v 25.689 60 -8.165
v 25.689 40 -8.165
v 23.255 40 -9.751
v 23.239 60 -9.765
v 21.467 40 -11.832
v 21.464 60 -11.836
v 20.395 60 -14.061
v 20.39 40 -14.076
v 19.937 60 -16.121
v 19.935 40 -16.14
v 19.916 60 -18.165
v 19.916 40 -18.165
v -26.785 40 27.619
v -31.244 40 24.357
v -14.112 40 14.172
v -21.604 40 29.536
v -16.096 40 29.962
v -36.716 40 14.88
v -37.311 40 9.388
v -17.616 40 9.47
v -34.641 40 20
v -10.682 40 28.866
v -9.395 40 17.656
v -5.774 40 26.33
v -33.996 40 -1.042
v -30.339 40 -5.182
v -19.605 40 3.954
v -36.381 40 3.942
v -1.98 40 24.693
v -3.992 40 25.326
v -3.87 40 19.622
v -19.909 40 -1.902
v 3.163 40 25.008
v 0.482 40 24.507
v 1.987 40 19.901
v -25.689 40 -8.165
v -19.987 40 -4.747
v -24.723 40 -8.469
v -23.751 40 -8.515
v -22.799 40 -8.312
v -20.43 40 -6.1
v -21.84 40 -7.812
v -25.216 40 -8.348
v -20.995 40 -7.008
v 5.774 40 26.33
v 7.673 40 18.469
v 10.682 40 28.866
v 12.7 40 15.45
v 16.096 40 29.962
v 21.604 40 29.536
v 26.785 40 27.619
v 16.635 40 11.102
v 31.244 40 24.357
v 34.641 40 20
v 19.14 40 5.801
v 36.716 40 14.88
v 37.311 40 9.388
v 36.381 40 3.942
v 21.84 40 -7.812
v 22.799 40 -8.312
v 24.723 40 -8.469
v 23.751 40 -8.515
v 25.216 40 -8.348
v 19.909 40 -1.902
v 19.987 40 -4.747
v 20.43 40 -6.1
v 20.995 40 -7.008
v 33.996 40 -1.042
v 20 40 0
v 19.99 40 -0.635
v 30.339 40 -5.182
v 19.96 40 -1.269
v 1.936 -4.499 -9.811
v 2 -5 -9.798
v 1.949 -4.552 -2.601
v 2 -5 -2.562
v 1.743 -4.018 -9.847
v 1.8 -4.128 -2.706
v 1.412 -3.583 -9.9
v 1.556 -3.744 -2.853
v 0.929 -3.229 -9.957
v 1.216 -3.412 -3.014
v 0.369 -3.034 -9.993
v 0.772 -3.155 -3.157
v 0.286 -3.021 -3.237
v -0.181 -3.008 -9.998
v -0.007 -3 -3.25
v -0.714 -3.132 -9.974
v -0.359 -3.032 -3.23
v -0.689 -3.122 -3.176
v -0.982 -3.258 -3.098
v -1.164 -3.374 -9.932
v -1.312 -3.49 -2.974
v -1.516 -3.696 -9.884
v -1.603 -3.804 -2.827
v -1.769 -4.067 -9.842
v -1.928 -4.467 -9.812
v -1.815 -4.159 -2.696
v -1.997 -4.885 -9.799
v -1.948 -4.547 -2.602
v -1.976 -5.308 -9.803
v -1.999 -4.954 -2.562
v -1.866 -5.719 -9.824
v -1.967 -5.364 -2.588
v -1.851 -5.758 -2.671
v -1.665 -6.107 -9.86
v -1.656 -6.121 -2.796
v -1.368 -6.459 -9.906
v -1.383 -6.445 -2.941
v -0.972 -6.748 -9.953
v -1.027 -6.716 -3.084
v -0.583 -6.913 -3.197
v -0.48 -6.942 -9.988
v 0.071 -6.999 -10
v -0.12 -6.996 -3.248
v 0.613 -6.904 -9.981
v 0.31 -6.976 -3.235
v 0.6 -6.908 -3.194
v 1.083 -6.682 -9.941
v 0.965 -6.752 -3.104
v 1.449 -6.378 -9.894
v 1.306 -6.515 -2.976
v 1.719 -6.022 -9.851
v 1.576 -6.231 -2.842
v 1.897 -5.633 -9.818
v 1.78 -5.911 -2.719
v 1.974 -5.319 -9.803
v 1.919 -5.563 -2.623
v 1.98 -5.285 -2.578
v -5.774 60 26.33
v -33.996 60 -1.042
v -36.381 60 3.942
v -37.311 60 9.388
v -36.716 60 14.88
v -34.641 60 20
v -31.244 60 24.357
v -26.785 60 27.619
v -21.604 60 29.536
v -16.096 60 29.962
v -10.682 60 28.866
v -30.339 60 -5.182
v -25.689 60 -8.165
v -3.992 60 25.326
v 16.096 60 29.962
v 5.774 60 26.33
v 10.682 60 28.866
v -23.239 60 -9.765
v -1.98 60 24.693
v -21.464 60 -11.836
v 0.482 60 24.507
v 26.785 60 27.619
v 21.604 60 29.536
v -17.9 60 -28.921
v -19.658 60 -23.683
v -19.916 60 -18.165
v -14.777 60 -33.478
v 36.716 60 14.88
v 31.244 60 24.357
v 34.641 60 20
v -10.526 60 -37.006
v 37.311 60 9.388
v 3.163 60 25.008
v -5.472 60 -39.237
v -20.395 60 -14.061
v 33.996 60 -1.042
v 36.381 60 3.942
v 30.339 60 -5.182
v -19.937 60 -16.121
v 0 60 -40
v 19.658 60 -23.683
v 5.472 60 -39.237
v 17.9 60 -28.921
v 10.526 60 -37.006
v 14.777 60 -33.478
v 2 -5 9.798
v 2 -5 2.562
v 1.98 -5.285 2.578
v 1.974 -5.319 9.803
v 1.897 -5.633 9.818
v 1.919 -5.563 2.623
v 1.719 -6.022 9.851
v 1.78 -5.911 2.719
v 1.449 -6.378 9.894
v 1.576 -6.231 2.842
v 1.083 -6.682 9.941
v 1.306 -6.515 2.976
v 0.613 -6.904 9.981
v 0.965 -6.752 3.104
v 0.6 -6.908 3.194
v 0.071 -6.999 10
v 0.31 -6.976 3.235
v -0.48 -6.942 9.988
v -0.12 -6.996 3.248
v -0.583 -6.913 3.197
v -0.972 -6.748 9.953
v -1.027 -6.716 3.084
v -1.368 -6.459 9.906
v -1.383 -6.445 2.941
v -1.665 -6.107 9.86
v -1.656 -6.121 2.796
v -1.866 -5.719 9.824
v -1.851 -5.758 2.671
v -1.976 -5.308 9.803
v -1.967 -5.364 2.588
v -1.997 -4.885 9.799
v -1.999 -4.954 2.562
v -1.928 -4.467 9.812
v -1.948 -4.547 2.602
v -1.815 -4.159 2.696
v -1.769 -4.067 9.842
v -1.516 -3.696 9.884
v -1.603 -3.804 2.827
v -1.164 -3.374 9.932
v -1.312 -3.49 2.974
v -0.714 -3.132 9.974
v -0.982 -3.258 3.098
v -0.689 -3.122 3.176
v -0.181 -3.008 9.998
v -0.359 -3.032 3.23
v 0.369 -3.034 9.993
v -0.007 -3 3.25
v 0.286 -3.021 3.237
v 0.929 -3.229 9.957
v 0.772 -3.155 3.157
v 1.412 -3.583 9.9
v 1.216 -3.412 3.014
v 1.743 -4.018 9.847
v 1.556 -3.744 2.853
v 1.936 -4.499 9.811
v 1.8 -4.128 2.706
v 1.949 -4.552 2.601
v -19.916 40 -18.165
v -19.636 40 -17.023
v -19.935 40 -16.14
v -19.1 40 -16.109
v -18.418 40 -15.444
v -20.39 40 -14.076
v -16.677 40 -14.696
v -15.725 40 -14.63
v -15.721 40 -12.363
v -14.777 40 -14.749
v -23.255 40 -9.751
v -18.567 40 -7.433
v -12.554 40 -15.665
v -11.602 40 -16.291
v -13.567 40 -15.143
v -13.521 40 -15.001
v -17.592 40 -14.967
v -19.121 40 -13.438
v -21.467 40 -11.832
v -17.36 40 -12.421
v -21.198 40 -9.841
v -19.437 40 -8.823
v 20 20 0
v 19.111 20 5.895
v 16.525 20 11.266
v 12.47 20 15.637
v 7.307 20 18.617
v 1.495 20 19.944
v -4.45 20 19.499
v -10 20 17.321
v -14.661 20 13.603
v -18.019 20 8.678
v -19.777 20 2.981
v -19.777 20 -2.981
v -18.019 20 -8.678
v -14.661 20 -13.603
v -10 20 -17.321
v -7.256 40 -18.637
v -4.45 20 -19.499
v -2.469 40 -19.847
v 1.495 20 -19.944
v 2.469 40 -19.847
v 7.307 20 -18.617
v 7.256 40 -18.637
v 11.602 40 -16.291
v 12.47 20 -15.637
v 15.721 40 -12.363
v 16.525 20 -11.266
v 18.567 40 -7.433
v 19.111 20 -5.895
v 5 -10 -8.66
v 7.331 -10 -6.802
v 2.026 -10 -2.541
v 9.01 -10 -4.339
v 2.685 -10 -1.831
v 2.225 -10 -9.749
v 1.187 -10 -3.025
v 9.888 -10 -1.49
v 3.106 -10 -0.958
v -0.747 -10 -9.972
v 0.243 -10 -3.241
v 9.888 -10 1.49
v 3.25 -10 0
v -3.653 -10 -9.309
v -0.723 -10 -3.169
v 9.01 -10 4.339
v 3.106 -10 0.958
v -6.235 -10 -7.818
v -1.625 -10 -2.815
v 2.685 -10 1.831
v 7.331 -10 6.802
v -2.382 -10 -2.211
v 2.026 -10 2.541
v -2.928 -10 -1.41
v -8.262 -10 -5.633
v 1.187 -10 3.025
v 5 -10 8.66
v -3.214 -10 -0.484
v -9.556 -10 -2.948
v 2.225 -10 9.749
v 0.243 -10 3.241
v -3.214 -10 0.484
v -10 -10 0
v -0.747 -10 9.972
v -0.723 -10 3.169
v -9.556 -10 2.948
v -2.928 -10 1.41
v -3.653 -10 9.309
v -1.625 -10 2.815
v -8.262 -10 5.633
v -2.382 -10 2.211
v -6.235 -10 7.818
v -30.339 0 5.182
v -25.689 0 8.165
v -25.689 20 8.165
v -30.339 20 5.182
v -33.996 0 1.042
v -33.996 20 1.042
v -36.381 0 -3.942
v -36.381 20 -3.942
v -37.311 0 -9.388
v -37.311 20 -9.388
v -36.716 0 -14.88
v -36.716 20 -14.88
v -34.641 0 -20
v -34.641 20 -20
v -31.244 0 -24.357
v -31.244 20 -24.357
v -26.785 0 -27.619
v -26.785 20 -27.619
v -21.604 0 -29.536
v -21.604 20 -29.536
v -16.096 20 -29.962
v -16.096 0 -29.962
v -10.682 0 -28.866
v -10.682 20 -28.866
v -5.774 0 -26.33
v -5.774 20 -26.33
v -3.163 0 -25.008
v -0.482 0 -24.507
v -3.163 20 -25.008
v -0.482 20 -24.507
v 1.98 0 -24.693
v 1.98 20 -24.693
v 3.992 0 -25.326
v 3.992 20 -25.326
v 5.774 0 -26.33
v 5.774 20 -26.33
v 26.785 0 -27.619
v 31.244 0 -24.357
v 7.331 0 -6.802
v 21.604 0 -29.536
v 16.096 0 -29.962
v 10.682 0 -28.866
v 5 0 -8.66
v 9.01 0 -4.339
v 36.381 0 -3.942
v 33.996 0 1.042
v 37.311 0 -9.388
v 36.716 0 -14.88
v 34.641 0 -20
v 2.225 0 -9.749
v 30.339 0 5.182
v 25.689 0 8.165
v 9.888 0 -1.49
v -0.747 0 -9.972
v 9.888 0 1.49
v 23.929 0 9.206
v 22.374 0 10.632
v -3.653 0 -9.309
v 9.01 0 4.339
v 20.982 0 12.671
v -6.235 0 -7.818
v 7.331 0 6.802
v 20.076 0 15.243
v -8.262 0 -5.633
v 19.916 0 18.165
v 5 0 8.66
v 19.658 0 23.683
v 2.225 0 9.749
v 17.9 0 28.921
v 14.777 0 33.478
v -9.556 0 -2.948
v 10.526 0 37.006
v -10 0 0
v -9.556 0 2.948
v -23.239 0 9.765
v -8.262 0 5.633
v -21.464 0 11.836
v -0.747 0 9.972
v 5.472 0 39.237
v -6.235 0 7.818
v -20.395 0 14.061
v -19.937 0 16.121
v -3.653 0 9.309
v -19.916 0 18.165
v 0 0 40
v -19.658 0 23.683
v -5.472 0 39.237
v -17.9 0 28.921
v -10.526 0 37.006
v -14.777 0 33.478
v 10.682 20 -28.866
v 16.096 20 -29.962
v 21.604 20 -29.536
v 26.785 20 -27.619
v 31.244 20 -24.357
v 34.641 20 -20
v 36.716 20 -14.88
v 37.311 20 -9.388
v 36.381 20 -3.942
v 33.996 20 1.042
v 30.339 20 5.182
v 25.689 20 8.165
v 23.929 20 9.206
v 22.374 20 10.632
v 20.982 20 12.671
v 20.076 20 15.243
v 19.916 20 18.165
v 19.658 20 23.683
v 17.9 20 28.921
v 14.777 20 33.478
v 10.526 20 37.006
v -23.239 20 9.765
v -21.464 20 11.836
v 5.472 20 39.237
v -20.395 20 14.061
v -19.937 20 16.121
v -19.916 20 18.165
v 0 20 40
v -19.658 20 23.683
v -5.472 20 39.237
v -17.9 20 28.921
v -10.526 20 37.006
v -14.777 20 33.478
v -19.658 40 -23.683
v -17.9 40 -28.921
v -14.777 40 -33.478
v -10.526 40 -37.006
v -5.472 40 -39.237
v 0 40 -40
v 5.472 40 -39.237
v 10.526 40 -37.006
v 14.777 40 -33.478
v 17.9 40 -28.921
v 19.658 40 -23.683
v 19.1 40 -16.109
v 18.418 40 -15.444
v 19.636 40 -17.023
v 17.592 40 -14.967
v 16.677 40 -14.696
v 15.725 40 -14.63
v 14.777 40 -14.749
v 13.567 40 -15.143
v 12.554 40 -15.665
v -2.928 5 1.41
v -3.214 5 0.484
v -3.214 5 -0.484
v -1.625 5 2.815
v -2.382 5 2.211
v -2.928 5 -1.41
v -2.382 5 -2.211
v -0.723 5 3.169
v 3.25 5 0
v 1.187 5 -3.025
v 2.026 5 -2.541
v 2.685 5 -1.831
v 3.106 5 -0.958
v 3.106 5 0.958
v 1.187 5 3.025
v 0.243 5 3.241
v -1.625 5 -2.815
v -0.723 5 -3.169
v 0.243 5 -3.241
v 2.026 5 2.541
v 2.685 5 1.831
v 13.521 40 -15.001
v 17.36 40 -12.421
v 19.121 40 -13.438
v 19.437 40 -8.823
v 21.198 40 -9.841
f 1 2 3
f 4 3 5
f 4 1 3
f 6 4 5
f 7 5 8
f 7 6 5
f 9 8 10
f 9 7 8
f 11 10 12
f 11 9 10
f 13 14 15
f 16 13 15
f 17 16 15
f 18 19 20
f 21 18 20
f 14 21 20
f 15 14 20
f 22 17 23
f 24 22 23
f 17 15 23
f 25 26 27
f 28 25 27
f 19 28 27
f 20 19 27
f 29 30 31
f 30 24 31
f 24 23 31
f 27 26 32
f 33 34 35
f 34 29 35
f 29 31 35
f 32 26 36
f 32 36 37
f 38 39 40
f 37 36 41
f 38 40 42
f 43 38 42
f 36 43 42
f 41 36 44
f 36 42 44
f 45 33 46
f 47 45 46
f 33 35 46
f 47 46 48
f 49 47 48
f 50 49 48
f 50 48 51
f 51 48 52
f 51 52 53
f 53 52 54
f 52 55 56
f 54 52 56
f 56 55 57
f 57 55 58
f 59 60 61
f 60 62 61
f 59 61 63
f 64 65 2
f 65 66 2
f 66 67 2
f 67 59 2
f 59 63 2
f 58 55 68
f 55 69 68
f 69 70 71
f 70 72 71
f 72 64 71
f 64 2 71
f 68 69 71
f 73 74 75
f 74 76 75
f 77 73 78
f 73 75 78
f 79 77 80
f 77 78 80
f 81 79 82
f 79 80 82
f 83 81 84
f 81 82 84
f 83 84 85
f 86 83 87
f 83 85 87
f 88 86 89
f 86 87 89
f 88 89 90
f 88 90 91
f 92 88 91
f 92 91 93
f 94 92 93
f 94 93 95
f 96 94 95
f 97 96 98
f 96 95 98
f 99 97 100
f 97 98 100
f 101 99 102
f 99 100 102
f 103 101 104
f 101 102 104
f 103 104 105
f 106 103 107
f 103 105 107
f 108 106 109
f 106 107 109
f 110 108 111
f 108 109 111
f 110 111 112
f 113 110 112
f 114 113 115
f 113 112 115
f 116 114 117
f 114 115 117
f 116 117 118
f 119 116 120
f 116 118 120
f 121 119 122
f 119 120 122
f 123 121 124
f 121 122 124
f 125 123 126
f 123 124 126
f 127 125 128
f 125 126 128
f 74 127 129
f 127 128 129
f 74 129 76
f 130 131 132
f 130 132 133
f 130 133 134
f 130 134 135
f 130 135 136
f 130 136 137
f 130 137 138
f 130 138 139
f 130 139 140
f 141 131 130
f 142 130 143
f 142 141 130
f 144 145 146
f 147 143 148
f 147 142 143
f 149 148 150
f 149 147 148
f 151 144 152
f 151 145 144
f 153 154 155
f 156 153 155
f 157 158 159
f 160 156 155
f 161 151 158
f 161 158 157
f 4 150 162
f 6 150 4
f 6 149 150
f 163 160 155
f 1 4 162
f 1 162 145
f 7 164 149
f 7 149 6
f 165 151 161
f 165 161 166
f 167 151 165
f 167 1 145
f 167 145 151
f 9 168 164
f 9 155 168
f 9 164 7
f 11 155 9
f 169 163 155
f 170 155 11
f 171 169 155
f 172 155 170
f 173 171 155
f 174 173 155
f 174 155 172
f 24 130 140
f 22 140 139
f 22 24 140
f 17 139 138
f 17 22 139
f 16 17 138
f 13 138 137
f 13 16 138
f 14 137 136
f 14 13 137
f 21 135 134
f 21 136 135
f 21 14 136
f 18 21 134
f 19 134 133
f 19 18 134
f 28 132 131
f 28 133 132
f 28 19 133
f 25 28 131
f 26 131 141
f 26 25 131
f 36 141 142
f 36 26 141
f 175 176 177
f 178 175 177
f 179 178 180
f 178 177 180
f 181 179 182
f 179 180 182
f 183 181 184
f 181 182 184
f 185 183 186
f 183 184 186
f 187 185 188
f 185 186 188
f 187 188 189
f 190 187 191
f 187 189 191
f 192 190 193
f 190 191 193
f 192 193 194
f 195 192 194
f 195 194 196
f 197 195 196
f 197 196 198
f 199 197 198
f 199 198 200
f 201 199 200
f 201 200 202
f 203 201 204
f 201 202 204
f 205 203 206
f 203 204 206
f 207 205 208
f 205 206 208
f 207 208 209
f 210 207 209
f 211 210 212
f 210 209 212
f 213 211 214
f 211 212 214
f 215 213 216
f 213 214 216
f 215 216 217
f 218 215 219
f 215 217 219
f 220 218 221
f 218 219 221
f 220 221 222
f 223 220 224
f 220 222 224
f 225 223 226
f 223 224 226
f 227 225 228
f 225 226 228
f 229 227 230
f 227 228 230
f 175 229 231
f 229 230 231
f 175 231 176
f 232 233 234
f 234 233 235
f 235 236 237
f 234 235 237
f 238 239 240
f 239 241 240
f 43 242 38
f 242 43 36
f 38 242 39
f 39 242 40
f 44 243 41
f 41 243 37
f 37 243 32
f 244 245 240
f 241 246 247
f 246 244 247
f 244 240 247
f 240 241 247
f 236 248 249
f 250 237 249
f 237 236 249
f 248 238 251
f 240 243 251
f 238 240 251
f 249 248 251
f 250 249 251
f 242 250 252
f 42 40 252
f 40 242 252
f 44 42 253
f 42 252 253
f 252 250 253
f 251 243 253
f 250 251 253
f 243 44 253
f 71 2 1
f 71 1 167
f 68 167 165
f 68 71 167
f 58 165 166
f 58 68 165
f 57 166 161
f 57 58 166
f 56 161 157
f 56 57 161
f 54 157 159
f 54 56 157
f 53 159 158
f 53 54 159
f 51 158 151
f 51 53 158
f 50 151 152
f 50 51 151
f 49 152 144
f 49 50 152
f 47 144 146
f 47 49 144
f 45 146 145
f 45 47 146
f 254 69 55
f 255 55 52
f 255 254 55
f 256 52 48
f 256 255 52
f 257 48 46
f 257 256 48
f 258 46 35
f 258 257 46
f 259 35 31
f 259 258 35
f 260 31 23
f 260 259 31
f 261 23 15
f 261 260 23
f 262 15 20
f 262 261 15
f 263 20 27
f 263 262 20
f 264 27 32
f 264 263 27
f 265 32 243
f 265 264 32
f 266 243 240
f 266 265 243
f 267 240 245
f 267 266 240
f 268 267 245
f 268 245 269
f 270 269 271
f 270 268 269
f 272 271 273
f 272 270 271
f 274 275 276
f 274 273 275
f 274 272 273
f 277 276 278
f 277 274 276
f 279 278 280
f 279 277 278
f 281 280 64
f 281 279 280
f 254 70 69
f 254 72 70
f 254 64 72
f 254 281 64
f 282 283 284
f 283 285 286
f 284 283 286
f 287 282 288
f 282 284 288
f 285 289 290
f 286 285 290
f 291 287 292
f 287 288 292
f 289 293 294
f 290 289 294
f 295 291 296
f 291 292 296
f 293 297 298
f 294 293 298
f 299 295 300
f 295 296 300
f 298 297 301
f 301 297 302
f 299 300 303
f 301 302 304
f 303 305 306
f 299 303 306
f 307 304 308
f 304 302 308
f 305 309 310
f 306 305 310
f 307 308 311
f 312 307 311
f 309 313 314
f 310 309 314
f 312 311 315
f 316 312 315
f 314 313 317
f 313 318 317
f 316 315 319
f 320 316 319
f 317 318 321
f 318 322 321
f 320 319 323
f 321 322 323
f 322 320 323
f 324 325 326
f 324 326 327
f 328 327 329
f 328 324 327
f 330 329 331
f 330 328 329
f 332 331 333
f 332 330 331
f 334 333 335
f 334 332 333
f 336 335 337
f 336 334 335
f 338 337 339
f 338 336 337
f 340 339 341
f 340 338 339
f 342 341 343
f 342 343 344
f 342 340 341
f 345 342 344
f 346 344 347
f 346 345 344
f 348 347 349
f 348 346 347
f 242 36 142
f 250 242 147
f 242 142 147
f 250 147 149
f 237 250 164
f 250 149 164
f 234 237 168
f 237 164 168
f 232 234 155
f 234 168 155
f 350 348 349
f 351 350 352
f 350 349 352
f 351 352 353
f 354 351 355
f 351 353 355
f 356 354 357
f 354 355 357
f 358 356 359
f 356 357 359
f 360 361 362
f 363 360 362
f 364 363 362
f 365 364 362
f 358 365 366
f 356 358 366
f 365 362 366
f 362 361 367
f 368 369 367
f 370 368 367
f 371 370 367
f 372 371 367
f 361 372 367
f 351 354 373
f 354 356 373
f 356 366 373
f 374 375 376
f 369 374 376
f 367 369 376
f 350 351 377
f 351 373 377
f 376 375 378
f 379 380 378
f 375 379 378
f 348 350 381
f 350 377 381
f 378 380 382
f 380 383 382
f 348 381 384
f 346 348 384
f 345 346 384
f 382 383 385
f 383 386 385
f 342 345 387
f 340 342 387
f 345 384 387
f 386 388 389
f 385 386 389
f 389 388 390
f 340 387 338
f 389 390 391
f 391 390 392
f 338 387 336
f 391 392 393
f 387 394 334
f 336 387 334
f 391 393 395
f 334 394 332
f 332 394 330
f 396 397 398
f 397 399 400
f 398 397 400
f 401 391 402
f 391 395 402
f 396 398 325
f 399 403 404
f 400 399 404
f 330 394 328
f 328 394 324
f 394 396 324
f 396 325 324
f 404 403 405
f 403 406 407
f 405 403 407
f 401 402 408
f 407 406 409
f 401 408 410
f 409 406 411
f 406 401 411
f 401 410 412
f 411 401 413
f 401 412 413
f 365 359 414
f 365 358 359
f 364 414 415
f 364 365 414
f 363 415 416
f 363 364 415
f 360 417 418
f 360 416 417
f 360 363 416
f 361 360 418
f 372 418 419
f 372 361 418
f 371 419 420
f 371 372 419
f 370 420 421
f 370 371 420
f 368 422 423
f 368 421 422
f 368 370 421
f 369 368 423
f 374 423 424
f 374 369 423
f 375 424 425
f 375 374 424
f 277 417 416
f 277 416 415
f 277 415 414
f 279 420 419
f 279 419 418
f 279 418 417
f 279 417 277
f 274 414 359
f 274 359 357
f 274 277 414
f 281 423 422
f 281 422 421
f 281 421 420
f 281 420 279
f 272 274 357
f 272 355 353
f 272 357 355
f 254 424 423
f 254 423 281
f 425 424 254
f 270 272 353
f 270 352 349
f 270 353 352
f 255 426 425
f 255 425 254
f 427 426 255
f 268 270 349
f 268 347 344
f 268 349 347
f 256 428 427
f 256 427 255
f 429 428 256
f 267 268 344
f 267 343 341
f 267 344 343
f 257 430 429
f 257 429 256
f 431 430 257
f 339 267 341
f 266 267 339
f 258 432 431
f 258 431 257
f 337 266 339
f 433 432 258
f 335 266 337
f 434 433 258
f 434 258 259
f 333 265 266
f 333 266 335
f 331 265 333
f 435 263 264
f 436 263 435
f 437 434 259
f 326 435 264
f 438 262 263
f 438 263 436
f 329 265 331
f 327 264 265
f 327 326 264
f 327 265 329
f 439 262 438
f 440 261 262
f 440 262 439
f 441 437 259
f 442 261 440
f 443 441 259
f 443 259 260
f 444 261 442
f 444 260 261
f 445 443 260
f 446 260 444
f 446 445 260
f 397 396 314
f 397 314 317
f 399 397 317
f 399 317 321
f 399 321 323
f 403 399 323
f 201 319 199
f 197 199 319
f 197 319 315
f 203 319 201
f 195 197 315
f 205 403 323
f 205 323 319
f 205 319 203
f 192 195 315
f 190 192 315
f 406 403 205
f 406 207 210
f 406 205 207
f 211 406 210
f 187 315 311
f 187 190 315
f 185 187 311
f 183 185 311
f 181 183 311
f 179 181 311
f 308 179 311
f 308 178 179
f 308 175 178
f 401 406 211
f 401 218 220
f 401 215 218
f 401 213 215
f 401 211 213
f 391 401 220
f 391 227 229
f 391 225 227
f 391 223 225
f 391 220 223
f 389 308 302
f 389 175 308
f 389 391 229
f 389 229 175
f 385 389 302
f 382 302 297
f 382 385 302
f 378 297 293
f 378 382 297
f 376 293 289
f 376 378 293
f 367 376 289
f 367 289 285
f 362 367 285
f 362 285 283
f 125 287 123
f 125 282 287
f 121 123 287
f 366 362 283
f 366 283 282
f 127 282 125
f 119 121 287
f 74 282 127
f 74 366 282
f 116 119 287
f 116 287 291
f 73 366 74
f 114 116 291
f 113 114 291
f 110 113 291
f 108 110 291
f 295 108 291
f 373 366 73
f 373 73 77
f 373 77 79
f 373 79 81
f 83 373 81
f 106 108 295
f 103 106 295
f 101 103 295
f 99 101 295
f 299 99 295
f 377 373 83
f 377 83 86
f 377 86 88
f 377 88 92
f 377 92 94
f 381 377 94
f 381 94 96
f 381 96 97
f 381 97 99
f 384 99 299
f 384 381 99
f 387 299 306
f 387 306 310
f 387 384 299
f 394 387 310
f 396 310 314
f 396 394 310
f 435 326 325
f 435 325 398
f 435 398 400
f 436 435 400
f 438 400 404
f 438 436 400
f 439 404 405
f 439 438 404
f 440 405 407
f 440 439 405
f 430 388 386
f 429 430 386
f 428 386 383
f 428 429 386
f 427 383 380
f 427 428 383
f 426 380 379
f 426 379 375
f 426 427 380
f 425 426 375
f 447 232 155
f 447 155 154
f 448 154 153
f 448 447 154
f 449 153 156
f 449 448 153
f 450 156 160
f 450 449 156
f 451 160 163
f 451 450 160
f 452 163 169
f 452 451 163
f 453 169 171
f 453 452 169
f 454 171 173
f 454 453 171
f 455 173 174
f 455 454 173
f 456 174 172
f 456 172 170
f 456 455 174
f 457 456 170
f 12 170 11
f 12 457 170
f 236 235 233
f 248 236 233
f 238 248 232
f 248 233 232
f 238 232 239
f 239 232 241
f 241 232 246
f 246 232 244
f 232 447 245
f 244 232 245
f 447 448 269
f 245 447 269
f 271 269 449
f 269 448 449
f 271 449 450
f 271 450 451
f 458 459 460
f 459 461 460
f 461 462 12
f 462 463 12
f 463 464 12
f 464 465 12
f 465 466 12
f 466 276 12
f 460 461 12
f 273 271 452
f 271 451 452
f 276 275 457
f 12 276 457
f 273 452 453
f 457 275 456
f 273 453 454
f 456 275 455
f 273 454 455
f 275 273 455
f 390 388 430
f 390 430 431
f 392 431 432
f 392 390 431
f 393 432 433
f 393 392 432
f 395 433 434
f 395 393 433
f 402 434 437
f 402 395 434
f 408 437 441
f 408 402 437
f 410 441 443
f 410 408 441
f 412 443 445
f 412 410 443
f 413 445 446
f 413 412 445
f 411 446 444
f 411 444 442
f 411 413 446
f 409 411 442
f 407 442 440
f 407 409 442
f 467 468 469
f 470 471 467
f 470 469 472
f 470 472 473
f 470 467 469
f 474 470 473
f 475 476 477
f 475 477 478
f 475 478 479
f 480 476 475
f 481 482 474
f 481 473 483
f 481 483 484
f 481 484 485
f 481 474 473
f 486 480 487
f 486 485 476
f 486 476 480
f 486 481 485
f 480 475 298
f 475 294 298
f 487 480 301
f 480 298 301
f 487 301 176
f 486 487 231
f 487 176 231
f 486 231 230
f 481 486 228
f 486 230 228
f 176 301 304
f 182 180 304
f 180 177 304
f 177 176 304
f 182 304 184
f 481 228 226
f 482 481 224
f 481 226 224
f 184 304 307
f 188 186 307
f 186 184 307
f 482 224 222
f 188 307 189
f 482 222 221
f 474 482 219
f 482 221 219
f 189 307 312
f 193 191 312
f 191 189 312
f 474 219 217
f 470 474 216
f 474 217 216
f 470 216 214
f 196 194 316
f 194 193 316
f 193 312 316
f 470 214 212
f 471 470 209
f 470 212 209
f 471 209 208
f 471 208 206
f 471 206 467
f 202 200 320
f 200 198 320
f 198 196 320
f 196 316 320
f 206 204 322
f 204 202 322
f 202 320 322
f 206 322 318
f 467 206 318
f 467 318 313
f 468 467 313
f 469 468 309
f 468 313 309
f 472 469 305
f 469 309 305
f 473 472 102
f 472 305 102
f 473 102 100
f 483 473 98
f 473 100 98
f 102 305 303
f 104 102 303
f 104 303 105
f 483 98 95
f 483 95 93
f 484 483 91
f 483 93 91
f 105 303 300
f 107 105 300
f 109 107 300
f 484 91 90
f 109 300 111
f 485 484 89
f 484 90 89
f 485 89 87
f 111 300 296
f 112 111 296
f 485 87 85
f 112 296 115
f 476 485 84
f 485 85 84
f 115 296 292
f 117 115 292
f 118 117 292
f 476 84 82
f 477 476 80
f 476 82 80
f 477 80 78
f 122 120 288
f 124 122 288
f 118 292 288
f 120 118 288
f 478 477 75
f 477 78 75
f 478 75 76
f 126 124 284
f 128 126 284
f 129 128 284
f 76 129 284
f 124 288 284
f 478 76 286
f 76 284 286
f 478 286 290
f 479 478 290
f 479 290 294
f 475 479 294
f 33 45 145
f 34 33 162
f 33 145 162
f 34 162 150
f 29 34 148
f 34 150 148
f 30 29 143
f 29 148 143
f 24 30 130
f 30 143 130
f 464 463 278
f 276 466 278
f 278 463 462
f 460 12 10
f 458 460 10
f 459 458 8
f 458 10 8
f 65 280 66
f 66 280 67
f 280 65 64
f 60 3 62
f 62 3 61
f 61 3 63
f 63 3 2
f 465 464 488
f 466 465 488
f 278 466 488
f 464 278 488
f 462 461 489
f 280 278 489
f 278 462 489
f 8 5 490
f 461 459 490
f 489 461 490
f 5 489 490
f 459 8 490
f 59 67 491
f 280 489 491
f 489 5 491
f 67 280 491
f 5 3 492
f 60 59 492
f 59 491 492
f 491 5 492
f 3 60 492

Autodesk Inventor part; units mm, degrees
ref_plane "YZ Plane" through (0, 0, 0) normal (1, 0, 0) x (0, 1, 0)
ref_plane "XZ Plane" through (0, 0, 0) normal (0, 1, 0) x (-1, 0, 0)
ref_plane "XY Plane" through (0, 0, 0) normal (0, 0, 1) x (1, 0, 0)
sketch "Sketch1" plane through (0, 0, 0) normal (0, 1, 0) x (-1, 0, 0)
  circle A0 centre (0, 0) radius 20 construction
  circle A1 centre (0, 20) radius 20
  circle A2 centre (0, 0) radius 20 construction
  circle A3 centre (-17.3205, -10) radius 20
  circle A4 centre (0, 0) radius 20 construction
  circle A5 centre (17.3205, -10) radius 20
  dimension "d0" = 40
  dimension "d1" = 40
  dimension "d4" = 360
extrude "Extrusion1" add sketch "Sketch1" along normal blind 20
fillet "Fillet1" radius 10 1 edges at (0, 10, -20)
fillet "Fillet2" radius 10 1 edges at (-17.3205, 10, 10)
fillet "Fillet3" radius 10 1 edges at (17.3205, 10, 10)
sketch "Sketch2" plane through (0, 0, 0) normal (0, 1, 0) x (-1, 0, 0)
  circle A0 centre (0, 0) radius 10
  dimension "d11" = 20
extrude "Extrusion2" add sketch "Sketch2" against normal blind 10
sketch "Sketch3" plane through (0, 0, 0) normal (0, 0, 1) x (1, 0, 0)
  circle A0 centre (0, -5) radius 2
  line L0 (-10, -10) -> (10, -10) projected
  point P0 (0, 0)
  dimension "d14" = 4
  dimension "d15" = 5
extrude "Extrusion3" cut sketch "Sketch3" along normal through all both and the other way through all
sketch "Sketch4" plane through (0, -10, 0) normal (0, -1, 0) x (1, 0, 0)
  circle A0 centre (0, 0) radius 3.25
  dimension "d18" = 6.5
extrude "Extrusion4" cut sketch "Sketch4" against normal blind 15
sketch "Sketch6" plane through (0, 20, 0) normal (0, 1, 0) x (1, 0, 0)
  circle A0 centre (0, 0) radius 20
  dimension "d26" = 40
extrude "Extrusion5" add sketch "Sketch6" along normal blind 20
sketch "Sketch7" plane through (0, 40, 0) normal (0, 1, 0) x (1, 0, 0)
  circle A0 centre (0, 0) radius 20 construction
  circle A1 centre (0, 20) radius 20
  circle A2 centre (0, 0) radius 20 construction
  circle A3 centre (-17.3205, -10) radius 20
  circle A4 centre (0, 0) radius 20 construction
  circle A5 centre (17.3205, -10) radius 20
  dimension "d31" = 40
  dimension "d32" = 40
  dimension "d33" = 360
extrude "Extrusion6" add sketch "Sketch7" along normal blind 20
fillet "Fillet4" radius 10 3 edges at (17.3205, 50, -10) (-17.3205, 50, -10) (0, 50, 20)
equation "\"d1\" = d0"
equation "\"d32\" = d31"
properties part number "field-mover"
